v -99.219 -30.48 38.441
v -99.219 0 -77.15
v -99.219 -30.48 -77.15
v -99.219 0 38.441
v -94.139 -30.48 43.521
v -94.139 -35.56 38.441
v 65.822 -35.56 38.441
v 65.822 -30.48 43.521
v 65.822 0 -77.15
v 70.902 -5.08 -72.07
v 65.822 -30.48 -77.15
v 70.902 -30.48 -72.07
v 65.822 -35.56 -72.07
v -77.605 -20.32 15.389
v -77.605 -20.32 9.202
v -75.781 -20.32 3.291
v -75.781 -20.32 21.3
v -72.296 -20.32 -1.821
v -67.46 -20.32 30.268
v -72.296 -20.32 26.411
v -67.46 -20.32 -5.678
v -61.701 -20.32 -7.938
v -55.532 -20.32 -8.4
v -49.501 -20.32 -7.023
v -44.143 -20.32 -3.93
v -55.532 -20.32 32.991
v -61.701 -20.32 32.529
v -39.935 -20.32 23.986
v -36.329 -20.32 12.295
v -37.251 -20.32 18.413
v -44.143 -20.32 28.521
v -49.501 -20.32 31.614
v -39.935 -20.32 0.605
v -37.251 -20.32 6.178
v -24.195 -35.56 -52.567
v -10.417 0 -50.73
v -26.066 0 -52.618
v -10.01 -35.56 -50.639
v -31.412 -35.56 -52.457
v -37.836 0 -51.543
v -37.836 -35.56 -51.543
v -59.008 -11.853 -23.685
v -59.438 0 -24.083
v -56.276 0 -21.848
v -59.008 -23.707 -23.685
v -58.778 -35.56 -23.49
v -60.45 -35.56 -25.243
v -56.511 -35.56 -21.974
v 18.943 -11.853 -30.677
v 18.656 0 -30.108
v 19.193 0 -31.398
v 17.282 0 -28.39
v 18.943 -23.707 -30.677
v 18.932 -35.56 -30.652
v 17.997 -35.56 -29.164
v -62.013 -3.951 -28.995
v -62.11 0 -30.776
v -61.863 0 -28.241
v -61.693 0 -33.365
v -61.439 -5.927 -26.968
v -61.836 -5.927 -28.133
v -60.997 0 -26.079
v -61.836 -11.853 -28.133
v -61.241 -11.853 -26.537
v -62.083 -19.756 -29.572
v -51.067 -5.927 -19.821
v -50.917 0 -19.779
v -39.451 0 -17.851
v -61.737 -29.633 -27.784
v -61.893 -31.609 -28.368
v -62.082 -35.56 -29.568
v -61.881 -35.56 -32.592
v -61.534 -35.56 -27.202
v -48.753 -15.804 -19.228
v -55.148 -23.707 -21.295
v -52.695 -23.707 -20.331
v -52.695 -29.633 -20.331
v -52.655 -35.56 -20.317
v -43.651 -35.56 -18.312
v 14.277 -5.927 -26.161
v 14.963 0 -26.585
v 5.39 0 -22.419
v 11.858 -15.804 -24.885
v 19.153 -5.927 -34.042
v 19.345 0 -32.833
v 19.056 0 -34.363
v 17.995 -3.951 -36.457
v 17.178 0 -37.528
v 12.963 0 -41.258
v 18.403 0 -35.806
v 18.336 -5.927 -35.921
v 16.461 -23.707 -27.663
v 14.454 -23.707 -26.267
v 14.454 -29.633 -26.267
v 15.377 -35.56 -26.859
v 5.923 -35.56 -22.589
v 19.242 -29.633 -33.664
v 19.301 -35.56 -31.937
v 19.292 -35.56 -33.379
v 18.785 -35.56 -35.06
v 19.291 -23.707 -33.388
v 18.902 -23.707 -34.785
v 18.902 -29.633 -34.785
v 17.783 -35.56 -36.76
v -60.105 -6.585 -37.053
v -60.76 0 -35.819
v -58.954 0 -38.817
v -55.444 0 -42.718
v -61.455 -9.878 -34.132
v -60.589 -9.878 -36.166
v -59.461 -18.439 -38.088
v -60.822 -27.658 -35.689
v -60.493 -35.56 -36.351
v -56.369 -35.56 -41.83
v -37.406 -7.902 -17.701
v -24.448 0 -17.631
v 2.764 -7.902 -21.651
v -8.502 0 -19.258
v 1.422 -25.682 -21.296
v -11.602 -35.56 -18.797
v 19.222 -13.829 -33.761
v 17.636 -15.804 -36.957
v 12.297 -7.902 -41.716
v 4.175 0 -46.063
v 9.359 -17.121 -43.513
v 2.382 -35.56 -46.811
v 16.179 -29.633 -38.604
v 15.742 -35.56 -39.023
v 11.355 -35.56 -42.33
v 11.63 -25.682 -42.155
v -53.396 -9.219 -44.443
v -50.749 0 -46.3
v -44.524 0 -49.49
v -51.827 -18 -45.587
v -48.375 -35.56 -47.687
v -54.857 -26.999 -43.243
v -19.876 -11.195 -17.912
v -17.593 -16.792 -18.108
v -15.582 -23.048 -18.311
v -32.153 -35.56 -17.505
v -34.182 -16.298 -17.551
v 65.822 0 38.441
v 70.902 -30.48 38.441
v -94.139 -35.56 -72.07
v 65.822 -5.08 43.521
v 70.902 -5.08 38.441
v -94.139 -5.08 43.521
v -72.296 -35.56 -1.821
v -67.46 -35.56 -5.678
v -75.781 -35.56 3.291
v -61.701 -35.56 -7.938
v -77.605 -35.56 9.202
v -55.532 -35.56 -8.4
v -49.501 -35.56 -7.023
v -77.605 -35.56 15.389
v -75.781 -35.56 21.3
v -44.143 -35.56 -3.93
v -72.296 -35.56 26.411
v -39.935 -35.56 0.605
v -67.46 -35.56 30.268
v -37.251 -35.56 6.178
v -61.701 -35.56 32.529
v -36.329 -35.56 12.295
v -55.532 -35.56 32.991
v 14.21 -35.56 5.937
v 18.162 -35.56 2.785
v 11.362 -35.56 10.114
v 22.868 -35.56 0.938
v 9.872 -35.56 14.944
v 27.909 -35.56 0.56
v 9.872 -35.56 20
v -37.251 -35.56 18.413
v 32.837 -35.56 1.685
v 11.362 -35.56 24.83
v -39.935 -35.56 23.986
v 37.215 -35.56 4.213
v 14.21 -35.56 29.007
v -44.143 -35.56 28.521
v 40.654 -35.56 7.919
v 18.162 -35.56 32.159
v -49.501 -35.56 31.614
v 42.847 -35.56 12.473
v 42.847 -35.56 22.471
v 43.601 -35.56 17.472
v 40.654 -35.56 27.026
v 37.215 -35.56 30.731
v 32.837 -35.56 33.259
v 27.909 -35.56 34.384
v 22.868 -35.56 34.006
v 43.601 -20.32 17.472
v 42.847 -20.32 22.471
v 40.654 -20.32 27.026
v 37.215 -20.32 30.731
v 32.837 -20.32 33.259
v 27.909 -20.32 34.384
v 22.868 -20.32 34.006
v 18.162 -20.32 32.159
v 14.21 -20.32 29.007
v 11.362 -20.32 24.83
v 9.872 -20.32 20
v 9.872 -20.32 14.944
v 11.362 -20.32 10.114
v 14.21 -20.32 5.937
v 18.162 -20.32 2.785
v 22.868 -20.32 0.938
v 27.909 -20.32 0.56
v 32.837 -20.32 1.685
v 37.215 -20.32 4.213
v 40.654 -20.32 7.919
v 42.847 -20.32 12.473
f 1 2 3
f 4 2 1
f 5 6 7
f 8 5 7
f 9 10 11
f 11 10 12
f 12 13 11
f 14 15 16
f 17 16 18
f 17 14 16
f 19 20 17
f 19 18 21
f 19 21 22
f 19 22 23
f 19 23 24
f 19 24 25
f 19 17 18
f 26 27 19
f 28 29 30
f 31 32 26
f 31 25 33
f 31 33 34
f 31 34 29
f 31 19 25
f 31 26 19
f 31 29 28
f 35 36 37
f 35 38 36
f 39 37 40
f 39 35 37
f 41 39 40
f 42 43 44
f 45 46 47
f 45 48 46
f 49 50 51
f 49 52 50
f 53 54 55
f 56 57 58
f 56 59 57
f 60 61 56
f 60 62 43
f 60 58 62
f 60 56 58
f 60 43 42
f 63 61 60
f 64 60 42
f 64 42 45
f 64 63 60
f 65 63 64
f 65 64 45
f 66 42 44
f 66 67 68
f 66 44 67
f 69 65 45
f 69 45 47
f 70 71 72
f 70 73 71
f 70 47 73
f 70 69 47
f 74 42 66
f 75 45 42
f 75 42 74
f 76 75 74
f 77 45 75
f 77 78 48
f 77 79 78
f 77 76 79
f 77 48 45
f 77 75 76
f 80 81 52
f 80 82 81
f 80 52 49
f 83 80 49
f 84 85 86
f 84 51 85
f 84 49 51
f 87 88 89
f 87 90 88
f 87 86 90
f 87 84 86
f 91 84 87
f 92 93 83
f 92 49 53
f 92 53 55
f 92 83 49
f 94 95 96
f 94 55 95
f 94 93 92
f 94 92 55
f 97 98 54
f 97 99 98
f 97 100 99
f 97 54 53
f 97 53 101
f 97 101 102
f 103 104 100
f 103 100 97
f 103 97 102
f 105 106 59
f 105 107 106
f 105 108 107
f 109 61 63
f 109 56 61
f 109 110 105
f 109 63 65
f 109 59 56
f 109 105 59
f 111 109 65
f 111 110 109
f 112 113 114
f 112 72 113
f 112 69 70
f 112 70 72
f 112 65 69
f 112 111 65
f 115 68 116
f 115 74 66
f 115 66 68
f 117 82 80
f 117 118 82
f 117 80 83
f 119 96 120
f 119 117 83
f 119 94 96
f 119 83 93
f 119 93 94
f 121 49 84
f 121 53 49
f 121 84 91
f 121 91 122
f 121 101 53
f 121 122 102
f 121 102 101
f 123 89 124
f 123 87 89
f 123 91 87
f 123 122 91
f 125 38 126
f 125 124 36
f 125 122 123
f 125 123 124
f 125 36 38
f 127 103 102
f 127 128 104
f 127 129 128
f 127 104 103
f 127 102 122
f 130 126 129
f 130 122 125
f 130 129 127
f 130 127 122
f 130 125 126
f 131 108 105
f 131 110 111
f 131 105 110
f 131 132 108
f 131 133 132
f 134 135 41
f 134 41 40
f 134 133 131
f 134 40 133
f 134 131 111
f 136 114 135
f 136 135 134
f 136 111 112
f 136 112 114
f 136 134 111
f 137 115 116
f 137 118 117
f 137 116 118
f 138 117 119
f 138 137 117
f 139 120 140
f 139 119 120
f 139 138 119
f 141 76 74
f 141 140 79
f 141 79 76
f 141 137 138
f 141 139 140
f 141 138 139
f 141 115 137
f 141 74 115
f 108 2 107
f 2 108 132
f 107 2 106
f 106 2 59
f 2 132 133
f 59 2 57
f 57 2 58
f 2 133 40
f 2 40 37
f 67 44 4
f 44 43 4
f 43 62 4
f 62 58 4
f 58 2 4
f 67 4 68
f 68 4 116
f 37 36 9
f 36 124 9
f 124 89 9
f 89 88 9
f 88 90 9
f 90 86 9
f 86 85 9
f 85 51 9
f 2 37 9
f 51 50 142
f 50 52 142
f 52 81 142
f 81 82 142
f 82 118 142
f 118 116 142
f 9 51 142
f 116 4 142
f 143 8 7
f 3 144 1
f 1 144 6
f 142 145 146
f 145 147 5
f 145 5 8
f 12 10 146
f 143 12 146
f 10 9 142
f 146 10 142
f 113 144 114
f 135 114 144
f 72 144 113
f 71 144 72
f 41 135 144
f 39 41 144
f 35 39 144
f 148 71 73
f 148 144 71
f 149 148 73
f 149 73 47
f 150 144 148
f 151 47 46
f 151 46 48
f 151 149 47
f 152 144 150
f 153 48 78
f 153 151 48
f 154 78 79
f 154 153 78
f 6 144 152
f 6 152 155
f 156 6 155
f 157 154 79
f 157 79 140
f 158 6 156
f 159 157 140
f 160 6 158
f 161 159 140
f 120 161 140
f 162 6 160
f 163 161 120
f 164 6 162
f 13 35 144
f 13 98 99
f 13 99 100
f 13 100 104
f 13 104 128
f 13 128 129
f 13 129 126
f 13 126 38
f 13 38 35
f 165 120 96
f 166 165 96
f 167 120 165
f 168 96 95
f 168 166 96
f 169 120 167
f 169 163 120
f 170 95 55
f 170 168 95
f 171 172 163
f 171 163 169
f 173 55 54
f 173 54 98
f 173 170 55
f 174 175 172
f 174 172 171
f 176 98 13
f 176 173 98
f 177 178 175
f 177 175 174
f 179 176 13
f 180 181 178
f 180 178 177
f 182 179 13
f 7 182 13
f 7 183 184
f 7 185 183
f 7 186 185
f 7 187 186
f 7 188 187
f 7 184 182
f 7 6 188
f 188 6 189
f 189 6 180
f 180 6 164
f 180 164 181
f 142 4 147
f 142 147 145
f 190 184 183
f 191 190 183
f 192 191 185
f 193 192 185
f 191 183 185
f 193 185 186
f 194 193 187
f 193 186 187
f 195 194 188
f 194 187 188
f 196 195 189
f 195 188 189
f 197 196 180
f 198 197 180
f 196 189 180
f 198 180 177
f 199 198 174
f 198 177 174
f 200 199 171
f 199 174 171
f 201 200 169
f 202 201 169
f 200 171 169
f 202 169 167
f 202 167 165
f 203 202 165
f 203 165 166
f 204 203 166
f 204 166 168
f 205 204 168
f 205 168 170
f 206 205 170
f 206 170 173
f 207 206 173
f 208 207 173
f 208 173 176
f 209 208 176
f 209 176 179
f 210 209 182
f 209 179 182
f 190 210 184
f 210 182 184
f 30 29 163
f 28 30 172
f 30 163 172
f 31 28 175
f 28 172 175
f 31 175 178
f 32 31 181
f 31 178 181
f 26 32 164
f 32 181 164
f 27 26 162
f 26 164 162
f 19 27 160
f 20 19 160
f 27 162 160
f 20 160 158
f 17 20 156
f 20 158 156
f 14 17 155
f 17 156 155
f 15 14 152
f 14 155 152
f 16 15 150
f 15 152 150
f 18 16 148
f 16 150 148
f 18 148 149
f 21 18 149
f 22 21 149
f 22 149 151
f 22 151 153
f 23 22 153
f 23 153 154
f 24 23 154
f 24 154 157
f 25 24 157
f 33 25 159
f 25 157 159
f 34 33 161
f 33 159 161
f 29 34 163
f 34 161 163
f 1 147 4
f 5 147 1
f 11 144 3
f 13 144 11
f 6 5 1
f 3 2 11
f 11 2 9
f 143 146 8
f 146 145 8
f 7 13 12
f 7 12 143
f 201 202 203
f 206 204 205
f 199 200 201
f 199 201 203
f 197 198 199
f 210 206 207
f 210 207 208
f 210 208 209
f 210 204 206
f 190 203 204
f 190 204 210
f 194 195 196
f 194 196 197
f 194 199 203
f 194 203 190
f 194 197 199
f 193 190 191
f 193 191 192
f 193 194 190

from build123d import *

# Parameters (mm, degrees)
F0_W     = 170.1207906008
F0_H     = 120.6709034741
F1_DEPTH = 35.56
F2_SIZE  = 5.08
F3_W     = 43.2106815279
F3_H     = 37.201420404
F4_DEPTH = 26.416
F5_R     = 20.753484157
F5_R_2   = 16.9591840917
F6_DEPTH = 15.24
F8_DEPTH = 45.72


with BuildPart() as f1:
    # F0 (on Front) → F1 (new body)
    with BuildSketch(Plane.XZ):
        with Locations((-14.1588523984, -16.8147515506)):
            Rectangle(F0_W, F0_H)
    extrude(amount=F1_DEPTH)

    # F2
    f2_edges = [f1.edges().sort_by_distance(p)[0] for p in [
        (70.901543, -17.78, 43.5207),
        (-99.219248, -17.78, 43.5207),
        (-14.158852, 0, 43.5207),
        (-14.158852, -35.56, 43.5207),
        (-99.219248, -35.56, -16.814752),
        (-14.158852, -35.56, -77.150203),
        (70.901543, -35.56, -16.814752),
        (70.901543, -17.78, -77.150203),
        (70.901543, 0, -16.814752),
    ]]
    chamfer(f2_edges, length=F2_SIZE)

    # F3 (on face) → F4 (join)
    with BuildSketch(Plane.XZ.offset(35.56)):
        with Locations((-56.4028490335, -7.9972422682)):
            Rectangle(F3_W, F3_H)
    extrude(amount=-F4_DEPTH)

    # F5 (on face) → F6 (cut)
    with BuildSketch(Plane.XZ.offset(35.56)):
        with Locations((-57.0828169584, 12.2954472899)):
            Circle(F5_R)
        with Locations((26.6415085644, 17.472056672)):
            Circle(F5_R_2)
    extrude(amount=-F6_DEPTH, mode=Mode.SUBTRACT)

    # F7 (on face) → F8 (cut)
    with BuildSketch(Plane.XZ.offset(35.56)):
        with BuildLine():
            add(Edge.make_bspline(
                [(-37.8358364105, -51.5432469547), (-56.4956631924, -47.5123333932), (-85.1624102545, -7.6424527107), (65.6454542447, -24.0307948131), (-13.3011555528, -56.8432520915), (-37.8358364105, -51.5432469547)],
                knots=[0, 0, 0, 0, 0.2624393573, 0.6549343168, 1, 1, 1, 1], degree=3))
        make_face()
    extrude(amount=-F8_DEPTH, mode=Mode.SUBTRACT)


solid = f1.part
